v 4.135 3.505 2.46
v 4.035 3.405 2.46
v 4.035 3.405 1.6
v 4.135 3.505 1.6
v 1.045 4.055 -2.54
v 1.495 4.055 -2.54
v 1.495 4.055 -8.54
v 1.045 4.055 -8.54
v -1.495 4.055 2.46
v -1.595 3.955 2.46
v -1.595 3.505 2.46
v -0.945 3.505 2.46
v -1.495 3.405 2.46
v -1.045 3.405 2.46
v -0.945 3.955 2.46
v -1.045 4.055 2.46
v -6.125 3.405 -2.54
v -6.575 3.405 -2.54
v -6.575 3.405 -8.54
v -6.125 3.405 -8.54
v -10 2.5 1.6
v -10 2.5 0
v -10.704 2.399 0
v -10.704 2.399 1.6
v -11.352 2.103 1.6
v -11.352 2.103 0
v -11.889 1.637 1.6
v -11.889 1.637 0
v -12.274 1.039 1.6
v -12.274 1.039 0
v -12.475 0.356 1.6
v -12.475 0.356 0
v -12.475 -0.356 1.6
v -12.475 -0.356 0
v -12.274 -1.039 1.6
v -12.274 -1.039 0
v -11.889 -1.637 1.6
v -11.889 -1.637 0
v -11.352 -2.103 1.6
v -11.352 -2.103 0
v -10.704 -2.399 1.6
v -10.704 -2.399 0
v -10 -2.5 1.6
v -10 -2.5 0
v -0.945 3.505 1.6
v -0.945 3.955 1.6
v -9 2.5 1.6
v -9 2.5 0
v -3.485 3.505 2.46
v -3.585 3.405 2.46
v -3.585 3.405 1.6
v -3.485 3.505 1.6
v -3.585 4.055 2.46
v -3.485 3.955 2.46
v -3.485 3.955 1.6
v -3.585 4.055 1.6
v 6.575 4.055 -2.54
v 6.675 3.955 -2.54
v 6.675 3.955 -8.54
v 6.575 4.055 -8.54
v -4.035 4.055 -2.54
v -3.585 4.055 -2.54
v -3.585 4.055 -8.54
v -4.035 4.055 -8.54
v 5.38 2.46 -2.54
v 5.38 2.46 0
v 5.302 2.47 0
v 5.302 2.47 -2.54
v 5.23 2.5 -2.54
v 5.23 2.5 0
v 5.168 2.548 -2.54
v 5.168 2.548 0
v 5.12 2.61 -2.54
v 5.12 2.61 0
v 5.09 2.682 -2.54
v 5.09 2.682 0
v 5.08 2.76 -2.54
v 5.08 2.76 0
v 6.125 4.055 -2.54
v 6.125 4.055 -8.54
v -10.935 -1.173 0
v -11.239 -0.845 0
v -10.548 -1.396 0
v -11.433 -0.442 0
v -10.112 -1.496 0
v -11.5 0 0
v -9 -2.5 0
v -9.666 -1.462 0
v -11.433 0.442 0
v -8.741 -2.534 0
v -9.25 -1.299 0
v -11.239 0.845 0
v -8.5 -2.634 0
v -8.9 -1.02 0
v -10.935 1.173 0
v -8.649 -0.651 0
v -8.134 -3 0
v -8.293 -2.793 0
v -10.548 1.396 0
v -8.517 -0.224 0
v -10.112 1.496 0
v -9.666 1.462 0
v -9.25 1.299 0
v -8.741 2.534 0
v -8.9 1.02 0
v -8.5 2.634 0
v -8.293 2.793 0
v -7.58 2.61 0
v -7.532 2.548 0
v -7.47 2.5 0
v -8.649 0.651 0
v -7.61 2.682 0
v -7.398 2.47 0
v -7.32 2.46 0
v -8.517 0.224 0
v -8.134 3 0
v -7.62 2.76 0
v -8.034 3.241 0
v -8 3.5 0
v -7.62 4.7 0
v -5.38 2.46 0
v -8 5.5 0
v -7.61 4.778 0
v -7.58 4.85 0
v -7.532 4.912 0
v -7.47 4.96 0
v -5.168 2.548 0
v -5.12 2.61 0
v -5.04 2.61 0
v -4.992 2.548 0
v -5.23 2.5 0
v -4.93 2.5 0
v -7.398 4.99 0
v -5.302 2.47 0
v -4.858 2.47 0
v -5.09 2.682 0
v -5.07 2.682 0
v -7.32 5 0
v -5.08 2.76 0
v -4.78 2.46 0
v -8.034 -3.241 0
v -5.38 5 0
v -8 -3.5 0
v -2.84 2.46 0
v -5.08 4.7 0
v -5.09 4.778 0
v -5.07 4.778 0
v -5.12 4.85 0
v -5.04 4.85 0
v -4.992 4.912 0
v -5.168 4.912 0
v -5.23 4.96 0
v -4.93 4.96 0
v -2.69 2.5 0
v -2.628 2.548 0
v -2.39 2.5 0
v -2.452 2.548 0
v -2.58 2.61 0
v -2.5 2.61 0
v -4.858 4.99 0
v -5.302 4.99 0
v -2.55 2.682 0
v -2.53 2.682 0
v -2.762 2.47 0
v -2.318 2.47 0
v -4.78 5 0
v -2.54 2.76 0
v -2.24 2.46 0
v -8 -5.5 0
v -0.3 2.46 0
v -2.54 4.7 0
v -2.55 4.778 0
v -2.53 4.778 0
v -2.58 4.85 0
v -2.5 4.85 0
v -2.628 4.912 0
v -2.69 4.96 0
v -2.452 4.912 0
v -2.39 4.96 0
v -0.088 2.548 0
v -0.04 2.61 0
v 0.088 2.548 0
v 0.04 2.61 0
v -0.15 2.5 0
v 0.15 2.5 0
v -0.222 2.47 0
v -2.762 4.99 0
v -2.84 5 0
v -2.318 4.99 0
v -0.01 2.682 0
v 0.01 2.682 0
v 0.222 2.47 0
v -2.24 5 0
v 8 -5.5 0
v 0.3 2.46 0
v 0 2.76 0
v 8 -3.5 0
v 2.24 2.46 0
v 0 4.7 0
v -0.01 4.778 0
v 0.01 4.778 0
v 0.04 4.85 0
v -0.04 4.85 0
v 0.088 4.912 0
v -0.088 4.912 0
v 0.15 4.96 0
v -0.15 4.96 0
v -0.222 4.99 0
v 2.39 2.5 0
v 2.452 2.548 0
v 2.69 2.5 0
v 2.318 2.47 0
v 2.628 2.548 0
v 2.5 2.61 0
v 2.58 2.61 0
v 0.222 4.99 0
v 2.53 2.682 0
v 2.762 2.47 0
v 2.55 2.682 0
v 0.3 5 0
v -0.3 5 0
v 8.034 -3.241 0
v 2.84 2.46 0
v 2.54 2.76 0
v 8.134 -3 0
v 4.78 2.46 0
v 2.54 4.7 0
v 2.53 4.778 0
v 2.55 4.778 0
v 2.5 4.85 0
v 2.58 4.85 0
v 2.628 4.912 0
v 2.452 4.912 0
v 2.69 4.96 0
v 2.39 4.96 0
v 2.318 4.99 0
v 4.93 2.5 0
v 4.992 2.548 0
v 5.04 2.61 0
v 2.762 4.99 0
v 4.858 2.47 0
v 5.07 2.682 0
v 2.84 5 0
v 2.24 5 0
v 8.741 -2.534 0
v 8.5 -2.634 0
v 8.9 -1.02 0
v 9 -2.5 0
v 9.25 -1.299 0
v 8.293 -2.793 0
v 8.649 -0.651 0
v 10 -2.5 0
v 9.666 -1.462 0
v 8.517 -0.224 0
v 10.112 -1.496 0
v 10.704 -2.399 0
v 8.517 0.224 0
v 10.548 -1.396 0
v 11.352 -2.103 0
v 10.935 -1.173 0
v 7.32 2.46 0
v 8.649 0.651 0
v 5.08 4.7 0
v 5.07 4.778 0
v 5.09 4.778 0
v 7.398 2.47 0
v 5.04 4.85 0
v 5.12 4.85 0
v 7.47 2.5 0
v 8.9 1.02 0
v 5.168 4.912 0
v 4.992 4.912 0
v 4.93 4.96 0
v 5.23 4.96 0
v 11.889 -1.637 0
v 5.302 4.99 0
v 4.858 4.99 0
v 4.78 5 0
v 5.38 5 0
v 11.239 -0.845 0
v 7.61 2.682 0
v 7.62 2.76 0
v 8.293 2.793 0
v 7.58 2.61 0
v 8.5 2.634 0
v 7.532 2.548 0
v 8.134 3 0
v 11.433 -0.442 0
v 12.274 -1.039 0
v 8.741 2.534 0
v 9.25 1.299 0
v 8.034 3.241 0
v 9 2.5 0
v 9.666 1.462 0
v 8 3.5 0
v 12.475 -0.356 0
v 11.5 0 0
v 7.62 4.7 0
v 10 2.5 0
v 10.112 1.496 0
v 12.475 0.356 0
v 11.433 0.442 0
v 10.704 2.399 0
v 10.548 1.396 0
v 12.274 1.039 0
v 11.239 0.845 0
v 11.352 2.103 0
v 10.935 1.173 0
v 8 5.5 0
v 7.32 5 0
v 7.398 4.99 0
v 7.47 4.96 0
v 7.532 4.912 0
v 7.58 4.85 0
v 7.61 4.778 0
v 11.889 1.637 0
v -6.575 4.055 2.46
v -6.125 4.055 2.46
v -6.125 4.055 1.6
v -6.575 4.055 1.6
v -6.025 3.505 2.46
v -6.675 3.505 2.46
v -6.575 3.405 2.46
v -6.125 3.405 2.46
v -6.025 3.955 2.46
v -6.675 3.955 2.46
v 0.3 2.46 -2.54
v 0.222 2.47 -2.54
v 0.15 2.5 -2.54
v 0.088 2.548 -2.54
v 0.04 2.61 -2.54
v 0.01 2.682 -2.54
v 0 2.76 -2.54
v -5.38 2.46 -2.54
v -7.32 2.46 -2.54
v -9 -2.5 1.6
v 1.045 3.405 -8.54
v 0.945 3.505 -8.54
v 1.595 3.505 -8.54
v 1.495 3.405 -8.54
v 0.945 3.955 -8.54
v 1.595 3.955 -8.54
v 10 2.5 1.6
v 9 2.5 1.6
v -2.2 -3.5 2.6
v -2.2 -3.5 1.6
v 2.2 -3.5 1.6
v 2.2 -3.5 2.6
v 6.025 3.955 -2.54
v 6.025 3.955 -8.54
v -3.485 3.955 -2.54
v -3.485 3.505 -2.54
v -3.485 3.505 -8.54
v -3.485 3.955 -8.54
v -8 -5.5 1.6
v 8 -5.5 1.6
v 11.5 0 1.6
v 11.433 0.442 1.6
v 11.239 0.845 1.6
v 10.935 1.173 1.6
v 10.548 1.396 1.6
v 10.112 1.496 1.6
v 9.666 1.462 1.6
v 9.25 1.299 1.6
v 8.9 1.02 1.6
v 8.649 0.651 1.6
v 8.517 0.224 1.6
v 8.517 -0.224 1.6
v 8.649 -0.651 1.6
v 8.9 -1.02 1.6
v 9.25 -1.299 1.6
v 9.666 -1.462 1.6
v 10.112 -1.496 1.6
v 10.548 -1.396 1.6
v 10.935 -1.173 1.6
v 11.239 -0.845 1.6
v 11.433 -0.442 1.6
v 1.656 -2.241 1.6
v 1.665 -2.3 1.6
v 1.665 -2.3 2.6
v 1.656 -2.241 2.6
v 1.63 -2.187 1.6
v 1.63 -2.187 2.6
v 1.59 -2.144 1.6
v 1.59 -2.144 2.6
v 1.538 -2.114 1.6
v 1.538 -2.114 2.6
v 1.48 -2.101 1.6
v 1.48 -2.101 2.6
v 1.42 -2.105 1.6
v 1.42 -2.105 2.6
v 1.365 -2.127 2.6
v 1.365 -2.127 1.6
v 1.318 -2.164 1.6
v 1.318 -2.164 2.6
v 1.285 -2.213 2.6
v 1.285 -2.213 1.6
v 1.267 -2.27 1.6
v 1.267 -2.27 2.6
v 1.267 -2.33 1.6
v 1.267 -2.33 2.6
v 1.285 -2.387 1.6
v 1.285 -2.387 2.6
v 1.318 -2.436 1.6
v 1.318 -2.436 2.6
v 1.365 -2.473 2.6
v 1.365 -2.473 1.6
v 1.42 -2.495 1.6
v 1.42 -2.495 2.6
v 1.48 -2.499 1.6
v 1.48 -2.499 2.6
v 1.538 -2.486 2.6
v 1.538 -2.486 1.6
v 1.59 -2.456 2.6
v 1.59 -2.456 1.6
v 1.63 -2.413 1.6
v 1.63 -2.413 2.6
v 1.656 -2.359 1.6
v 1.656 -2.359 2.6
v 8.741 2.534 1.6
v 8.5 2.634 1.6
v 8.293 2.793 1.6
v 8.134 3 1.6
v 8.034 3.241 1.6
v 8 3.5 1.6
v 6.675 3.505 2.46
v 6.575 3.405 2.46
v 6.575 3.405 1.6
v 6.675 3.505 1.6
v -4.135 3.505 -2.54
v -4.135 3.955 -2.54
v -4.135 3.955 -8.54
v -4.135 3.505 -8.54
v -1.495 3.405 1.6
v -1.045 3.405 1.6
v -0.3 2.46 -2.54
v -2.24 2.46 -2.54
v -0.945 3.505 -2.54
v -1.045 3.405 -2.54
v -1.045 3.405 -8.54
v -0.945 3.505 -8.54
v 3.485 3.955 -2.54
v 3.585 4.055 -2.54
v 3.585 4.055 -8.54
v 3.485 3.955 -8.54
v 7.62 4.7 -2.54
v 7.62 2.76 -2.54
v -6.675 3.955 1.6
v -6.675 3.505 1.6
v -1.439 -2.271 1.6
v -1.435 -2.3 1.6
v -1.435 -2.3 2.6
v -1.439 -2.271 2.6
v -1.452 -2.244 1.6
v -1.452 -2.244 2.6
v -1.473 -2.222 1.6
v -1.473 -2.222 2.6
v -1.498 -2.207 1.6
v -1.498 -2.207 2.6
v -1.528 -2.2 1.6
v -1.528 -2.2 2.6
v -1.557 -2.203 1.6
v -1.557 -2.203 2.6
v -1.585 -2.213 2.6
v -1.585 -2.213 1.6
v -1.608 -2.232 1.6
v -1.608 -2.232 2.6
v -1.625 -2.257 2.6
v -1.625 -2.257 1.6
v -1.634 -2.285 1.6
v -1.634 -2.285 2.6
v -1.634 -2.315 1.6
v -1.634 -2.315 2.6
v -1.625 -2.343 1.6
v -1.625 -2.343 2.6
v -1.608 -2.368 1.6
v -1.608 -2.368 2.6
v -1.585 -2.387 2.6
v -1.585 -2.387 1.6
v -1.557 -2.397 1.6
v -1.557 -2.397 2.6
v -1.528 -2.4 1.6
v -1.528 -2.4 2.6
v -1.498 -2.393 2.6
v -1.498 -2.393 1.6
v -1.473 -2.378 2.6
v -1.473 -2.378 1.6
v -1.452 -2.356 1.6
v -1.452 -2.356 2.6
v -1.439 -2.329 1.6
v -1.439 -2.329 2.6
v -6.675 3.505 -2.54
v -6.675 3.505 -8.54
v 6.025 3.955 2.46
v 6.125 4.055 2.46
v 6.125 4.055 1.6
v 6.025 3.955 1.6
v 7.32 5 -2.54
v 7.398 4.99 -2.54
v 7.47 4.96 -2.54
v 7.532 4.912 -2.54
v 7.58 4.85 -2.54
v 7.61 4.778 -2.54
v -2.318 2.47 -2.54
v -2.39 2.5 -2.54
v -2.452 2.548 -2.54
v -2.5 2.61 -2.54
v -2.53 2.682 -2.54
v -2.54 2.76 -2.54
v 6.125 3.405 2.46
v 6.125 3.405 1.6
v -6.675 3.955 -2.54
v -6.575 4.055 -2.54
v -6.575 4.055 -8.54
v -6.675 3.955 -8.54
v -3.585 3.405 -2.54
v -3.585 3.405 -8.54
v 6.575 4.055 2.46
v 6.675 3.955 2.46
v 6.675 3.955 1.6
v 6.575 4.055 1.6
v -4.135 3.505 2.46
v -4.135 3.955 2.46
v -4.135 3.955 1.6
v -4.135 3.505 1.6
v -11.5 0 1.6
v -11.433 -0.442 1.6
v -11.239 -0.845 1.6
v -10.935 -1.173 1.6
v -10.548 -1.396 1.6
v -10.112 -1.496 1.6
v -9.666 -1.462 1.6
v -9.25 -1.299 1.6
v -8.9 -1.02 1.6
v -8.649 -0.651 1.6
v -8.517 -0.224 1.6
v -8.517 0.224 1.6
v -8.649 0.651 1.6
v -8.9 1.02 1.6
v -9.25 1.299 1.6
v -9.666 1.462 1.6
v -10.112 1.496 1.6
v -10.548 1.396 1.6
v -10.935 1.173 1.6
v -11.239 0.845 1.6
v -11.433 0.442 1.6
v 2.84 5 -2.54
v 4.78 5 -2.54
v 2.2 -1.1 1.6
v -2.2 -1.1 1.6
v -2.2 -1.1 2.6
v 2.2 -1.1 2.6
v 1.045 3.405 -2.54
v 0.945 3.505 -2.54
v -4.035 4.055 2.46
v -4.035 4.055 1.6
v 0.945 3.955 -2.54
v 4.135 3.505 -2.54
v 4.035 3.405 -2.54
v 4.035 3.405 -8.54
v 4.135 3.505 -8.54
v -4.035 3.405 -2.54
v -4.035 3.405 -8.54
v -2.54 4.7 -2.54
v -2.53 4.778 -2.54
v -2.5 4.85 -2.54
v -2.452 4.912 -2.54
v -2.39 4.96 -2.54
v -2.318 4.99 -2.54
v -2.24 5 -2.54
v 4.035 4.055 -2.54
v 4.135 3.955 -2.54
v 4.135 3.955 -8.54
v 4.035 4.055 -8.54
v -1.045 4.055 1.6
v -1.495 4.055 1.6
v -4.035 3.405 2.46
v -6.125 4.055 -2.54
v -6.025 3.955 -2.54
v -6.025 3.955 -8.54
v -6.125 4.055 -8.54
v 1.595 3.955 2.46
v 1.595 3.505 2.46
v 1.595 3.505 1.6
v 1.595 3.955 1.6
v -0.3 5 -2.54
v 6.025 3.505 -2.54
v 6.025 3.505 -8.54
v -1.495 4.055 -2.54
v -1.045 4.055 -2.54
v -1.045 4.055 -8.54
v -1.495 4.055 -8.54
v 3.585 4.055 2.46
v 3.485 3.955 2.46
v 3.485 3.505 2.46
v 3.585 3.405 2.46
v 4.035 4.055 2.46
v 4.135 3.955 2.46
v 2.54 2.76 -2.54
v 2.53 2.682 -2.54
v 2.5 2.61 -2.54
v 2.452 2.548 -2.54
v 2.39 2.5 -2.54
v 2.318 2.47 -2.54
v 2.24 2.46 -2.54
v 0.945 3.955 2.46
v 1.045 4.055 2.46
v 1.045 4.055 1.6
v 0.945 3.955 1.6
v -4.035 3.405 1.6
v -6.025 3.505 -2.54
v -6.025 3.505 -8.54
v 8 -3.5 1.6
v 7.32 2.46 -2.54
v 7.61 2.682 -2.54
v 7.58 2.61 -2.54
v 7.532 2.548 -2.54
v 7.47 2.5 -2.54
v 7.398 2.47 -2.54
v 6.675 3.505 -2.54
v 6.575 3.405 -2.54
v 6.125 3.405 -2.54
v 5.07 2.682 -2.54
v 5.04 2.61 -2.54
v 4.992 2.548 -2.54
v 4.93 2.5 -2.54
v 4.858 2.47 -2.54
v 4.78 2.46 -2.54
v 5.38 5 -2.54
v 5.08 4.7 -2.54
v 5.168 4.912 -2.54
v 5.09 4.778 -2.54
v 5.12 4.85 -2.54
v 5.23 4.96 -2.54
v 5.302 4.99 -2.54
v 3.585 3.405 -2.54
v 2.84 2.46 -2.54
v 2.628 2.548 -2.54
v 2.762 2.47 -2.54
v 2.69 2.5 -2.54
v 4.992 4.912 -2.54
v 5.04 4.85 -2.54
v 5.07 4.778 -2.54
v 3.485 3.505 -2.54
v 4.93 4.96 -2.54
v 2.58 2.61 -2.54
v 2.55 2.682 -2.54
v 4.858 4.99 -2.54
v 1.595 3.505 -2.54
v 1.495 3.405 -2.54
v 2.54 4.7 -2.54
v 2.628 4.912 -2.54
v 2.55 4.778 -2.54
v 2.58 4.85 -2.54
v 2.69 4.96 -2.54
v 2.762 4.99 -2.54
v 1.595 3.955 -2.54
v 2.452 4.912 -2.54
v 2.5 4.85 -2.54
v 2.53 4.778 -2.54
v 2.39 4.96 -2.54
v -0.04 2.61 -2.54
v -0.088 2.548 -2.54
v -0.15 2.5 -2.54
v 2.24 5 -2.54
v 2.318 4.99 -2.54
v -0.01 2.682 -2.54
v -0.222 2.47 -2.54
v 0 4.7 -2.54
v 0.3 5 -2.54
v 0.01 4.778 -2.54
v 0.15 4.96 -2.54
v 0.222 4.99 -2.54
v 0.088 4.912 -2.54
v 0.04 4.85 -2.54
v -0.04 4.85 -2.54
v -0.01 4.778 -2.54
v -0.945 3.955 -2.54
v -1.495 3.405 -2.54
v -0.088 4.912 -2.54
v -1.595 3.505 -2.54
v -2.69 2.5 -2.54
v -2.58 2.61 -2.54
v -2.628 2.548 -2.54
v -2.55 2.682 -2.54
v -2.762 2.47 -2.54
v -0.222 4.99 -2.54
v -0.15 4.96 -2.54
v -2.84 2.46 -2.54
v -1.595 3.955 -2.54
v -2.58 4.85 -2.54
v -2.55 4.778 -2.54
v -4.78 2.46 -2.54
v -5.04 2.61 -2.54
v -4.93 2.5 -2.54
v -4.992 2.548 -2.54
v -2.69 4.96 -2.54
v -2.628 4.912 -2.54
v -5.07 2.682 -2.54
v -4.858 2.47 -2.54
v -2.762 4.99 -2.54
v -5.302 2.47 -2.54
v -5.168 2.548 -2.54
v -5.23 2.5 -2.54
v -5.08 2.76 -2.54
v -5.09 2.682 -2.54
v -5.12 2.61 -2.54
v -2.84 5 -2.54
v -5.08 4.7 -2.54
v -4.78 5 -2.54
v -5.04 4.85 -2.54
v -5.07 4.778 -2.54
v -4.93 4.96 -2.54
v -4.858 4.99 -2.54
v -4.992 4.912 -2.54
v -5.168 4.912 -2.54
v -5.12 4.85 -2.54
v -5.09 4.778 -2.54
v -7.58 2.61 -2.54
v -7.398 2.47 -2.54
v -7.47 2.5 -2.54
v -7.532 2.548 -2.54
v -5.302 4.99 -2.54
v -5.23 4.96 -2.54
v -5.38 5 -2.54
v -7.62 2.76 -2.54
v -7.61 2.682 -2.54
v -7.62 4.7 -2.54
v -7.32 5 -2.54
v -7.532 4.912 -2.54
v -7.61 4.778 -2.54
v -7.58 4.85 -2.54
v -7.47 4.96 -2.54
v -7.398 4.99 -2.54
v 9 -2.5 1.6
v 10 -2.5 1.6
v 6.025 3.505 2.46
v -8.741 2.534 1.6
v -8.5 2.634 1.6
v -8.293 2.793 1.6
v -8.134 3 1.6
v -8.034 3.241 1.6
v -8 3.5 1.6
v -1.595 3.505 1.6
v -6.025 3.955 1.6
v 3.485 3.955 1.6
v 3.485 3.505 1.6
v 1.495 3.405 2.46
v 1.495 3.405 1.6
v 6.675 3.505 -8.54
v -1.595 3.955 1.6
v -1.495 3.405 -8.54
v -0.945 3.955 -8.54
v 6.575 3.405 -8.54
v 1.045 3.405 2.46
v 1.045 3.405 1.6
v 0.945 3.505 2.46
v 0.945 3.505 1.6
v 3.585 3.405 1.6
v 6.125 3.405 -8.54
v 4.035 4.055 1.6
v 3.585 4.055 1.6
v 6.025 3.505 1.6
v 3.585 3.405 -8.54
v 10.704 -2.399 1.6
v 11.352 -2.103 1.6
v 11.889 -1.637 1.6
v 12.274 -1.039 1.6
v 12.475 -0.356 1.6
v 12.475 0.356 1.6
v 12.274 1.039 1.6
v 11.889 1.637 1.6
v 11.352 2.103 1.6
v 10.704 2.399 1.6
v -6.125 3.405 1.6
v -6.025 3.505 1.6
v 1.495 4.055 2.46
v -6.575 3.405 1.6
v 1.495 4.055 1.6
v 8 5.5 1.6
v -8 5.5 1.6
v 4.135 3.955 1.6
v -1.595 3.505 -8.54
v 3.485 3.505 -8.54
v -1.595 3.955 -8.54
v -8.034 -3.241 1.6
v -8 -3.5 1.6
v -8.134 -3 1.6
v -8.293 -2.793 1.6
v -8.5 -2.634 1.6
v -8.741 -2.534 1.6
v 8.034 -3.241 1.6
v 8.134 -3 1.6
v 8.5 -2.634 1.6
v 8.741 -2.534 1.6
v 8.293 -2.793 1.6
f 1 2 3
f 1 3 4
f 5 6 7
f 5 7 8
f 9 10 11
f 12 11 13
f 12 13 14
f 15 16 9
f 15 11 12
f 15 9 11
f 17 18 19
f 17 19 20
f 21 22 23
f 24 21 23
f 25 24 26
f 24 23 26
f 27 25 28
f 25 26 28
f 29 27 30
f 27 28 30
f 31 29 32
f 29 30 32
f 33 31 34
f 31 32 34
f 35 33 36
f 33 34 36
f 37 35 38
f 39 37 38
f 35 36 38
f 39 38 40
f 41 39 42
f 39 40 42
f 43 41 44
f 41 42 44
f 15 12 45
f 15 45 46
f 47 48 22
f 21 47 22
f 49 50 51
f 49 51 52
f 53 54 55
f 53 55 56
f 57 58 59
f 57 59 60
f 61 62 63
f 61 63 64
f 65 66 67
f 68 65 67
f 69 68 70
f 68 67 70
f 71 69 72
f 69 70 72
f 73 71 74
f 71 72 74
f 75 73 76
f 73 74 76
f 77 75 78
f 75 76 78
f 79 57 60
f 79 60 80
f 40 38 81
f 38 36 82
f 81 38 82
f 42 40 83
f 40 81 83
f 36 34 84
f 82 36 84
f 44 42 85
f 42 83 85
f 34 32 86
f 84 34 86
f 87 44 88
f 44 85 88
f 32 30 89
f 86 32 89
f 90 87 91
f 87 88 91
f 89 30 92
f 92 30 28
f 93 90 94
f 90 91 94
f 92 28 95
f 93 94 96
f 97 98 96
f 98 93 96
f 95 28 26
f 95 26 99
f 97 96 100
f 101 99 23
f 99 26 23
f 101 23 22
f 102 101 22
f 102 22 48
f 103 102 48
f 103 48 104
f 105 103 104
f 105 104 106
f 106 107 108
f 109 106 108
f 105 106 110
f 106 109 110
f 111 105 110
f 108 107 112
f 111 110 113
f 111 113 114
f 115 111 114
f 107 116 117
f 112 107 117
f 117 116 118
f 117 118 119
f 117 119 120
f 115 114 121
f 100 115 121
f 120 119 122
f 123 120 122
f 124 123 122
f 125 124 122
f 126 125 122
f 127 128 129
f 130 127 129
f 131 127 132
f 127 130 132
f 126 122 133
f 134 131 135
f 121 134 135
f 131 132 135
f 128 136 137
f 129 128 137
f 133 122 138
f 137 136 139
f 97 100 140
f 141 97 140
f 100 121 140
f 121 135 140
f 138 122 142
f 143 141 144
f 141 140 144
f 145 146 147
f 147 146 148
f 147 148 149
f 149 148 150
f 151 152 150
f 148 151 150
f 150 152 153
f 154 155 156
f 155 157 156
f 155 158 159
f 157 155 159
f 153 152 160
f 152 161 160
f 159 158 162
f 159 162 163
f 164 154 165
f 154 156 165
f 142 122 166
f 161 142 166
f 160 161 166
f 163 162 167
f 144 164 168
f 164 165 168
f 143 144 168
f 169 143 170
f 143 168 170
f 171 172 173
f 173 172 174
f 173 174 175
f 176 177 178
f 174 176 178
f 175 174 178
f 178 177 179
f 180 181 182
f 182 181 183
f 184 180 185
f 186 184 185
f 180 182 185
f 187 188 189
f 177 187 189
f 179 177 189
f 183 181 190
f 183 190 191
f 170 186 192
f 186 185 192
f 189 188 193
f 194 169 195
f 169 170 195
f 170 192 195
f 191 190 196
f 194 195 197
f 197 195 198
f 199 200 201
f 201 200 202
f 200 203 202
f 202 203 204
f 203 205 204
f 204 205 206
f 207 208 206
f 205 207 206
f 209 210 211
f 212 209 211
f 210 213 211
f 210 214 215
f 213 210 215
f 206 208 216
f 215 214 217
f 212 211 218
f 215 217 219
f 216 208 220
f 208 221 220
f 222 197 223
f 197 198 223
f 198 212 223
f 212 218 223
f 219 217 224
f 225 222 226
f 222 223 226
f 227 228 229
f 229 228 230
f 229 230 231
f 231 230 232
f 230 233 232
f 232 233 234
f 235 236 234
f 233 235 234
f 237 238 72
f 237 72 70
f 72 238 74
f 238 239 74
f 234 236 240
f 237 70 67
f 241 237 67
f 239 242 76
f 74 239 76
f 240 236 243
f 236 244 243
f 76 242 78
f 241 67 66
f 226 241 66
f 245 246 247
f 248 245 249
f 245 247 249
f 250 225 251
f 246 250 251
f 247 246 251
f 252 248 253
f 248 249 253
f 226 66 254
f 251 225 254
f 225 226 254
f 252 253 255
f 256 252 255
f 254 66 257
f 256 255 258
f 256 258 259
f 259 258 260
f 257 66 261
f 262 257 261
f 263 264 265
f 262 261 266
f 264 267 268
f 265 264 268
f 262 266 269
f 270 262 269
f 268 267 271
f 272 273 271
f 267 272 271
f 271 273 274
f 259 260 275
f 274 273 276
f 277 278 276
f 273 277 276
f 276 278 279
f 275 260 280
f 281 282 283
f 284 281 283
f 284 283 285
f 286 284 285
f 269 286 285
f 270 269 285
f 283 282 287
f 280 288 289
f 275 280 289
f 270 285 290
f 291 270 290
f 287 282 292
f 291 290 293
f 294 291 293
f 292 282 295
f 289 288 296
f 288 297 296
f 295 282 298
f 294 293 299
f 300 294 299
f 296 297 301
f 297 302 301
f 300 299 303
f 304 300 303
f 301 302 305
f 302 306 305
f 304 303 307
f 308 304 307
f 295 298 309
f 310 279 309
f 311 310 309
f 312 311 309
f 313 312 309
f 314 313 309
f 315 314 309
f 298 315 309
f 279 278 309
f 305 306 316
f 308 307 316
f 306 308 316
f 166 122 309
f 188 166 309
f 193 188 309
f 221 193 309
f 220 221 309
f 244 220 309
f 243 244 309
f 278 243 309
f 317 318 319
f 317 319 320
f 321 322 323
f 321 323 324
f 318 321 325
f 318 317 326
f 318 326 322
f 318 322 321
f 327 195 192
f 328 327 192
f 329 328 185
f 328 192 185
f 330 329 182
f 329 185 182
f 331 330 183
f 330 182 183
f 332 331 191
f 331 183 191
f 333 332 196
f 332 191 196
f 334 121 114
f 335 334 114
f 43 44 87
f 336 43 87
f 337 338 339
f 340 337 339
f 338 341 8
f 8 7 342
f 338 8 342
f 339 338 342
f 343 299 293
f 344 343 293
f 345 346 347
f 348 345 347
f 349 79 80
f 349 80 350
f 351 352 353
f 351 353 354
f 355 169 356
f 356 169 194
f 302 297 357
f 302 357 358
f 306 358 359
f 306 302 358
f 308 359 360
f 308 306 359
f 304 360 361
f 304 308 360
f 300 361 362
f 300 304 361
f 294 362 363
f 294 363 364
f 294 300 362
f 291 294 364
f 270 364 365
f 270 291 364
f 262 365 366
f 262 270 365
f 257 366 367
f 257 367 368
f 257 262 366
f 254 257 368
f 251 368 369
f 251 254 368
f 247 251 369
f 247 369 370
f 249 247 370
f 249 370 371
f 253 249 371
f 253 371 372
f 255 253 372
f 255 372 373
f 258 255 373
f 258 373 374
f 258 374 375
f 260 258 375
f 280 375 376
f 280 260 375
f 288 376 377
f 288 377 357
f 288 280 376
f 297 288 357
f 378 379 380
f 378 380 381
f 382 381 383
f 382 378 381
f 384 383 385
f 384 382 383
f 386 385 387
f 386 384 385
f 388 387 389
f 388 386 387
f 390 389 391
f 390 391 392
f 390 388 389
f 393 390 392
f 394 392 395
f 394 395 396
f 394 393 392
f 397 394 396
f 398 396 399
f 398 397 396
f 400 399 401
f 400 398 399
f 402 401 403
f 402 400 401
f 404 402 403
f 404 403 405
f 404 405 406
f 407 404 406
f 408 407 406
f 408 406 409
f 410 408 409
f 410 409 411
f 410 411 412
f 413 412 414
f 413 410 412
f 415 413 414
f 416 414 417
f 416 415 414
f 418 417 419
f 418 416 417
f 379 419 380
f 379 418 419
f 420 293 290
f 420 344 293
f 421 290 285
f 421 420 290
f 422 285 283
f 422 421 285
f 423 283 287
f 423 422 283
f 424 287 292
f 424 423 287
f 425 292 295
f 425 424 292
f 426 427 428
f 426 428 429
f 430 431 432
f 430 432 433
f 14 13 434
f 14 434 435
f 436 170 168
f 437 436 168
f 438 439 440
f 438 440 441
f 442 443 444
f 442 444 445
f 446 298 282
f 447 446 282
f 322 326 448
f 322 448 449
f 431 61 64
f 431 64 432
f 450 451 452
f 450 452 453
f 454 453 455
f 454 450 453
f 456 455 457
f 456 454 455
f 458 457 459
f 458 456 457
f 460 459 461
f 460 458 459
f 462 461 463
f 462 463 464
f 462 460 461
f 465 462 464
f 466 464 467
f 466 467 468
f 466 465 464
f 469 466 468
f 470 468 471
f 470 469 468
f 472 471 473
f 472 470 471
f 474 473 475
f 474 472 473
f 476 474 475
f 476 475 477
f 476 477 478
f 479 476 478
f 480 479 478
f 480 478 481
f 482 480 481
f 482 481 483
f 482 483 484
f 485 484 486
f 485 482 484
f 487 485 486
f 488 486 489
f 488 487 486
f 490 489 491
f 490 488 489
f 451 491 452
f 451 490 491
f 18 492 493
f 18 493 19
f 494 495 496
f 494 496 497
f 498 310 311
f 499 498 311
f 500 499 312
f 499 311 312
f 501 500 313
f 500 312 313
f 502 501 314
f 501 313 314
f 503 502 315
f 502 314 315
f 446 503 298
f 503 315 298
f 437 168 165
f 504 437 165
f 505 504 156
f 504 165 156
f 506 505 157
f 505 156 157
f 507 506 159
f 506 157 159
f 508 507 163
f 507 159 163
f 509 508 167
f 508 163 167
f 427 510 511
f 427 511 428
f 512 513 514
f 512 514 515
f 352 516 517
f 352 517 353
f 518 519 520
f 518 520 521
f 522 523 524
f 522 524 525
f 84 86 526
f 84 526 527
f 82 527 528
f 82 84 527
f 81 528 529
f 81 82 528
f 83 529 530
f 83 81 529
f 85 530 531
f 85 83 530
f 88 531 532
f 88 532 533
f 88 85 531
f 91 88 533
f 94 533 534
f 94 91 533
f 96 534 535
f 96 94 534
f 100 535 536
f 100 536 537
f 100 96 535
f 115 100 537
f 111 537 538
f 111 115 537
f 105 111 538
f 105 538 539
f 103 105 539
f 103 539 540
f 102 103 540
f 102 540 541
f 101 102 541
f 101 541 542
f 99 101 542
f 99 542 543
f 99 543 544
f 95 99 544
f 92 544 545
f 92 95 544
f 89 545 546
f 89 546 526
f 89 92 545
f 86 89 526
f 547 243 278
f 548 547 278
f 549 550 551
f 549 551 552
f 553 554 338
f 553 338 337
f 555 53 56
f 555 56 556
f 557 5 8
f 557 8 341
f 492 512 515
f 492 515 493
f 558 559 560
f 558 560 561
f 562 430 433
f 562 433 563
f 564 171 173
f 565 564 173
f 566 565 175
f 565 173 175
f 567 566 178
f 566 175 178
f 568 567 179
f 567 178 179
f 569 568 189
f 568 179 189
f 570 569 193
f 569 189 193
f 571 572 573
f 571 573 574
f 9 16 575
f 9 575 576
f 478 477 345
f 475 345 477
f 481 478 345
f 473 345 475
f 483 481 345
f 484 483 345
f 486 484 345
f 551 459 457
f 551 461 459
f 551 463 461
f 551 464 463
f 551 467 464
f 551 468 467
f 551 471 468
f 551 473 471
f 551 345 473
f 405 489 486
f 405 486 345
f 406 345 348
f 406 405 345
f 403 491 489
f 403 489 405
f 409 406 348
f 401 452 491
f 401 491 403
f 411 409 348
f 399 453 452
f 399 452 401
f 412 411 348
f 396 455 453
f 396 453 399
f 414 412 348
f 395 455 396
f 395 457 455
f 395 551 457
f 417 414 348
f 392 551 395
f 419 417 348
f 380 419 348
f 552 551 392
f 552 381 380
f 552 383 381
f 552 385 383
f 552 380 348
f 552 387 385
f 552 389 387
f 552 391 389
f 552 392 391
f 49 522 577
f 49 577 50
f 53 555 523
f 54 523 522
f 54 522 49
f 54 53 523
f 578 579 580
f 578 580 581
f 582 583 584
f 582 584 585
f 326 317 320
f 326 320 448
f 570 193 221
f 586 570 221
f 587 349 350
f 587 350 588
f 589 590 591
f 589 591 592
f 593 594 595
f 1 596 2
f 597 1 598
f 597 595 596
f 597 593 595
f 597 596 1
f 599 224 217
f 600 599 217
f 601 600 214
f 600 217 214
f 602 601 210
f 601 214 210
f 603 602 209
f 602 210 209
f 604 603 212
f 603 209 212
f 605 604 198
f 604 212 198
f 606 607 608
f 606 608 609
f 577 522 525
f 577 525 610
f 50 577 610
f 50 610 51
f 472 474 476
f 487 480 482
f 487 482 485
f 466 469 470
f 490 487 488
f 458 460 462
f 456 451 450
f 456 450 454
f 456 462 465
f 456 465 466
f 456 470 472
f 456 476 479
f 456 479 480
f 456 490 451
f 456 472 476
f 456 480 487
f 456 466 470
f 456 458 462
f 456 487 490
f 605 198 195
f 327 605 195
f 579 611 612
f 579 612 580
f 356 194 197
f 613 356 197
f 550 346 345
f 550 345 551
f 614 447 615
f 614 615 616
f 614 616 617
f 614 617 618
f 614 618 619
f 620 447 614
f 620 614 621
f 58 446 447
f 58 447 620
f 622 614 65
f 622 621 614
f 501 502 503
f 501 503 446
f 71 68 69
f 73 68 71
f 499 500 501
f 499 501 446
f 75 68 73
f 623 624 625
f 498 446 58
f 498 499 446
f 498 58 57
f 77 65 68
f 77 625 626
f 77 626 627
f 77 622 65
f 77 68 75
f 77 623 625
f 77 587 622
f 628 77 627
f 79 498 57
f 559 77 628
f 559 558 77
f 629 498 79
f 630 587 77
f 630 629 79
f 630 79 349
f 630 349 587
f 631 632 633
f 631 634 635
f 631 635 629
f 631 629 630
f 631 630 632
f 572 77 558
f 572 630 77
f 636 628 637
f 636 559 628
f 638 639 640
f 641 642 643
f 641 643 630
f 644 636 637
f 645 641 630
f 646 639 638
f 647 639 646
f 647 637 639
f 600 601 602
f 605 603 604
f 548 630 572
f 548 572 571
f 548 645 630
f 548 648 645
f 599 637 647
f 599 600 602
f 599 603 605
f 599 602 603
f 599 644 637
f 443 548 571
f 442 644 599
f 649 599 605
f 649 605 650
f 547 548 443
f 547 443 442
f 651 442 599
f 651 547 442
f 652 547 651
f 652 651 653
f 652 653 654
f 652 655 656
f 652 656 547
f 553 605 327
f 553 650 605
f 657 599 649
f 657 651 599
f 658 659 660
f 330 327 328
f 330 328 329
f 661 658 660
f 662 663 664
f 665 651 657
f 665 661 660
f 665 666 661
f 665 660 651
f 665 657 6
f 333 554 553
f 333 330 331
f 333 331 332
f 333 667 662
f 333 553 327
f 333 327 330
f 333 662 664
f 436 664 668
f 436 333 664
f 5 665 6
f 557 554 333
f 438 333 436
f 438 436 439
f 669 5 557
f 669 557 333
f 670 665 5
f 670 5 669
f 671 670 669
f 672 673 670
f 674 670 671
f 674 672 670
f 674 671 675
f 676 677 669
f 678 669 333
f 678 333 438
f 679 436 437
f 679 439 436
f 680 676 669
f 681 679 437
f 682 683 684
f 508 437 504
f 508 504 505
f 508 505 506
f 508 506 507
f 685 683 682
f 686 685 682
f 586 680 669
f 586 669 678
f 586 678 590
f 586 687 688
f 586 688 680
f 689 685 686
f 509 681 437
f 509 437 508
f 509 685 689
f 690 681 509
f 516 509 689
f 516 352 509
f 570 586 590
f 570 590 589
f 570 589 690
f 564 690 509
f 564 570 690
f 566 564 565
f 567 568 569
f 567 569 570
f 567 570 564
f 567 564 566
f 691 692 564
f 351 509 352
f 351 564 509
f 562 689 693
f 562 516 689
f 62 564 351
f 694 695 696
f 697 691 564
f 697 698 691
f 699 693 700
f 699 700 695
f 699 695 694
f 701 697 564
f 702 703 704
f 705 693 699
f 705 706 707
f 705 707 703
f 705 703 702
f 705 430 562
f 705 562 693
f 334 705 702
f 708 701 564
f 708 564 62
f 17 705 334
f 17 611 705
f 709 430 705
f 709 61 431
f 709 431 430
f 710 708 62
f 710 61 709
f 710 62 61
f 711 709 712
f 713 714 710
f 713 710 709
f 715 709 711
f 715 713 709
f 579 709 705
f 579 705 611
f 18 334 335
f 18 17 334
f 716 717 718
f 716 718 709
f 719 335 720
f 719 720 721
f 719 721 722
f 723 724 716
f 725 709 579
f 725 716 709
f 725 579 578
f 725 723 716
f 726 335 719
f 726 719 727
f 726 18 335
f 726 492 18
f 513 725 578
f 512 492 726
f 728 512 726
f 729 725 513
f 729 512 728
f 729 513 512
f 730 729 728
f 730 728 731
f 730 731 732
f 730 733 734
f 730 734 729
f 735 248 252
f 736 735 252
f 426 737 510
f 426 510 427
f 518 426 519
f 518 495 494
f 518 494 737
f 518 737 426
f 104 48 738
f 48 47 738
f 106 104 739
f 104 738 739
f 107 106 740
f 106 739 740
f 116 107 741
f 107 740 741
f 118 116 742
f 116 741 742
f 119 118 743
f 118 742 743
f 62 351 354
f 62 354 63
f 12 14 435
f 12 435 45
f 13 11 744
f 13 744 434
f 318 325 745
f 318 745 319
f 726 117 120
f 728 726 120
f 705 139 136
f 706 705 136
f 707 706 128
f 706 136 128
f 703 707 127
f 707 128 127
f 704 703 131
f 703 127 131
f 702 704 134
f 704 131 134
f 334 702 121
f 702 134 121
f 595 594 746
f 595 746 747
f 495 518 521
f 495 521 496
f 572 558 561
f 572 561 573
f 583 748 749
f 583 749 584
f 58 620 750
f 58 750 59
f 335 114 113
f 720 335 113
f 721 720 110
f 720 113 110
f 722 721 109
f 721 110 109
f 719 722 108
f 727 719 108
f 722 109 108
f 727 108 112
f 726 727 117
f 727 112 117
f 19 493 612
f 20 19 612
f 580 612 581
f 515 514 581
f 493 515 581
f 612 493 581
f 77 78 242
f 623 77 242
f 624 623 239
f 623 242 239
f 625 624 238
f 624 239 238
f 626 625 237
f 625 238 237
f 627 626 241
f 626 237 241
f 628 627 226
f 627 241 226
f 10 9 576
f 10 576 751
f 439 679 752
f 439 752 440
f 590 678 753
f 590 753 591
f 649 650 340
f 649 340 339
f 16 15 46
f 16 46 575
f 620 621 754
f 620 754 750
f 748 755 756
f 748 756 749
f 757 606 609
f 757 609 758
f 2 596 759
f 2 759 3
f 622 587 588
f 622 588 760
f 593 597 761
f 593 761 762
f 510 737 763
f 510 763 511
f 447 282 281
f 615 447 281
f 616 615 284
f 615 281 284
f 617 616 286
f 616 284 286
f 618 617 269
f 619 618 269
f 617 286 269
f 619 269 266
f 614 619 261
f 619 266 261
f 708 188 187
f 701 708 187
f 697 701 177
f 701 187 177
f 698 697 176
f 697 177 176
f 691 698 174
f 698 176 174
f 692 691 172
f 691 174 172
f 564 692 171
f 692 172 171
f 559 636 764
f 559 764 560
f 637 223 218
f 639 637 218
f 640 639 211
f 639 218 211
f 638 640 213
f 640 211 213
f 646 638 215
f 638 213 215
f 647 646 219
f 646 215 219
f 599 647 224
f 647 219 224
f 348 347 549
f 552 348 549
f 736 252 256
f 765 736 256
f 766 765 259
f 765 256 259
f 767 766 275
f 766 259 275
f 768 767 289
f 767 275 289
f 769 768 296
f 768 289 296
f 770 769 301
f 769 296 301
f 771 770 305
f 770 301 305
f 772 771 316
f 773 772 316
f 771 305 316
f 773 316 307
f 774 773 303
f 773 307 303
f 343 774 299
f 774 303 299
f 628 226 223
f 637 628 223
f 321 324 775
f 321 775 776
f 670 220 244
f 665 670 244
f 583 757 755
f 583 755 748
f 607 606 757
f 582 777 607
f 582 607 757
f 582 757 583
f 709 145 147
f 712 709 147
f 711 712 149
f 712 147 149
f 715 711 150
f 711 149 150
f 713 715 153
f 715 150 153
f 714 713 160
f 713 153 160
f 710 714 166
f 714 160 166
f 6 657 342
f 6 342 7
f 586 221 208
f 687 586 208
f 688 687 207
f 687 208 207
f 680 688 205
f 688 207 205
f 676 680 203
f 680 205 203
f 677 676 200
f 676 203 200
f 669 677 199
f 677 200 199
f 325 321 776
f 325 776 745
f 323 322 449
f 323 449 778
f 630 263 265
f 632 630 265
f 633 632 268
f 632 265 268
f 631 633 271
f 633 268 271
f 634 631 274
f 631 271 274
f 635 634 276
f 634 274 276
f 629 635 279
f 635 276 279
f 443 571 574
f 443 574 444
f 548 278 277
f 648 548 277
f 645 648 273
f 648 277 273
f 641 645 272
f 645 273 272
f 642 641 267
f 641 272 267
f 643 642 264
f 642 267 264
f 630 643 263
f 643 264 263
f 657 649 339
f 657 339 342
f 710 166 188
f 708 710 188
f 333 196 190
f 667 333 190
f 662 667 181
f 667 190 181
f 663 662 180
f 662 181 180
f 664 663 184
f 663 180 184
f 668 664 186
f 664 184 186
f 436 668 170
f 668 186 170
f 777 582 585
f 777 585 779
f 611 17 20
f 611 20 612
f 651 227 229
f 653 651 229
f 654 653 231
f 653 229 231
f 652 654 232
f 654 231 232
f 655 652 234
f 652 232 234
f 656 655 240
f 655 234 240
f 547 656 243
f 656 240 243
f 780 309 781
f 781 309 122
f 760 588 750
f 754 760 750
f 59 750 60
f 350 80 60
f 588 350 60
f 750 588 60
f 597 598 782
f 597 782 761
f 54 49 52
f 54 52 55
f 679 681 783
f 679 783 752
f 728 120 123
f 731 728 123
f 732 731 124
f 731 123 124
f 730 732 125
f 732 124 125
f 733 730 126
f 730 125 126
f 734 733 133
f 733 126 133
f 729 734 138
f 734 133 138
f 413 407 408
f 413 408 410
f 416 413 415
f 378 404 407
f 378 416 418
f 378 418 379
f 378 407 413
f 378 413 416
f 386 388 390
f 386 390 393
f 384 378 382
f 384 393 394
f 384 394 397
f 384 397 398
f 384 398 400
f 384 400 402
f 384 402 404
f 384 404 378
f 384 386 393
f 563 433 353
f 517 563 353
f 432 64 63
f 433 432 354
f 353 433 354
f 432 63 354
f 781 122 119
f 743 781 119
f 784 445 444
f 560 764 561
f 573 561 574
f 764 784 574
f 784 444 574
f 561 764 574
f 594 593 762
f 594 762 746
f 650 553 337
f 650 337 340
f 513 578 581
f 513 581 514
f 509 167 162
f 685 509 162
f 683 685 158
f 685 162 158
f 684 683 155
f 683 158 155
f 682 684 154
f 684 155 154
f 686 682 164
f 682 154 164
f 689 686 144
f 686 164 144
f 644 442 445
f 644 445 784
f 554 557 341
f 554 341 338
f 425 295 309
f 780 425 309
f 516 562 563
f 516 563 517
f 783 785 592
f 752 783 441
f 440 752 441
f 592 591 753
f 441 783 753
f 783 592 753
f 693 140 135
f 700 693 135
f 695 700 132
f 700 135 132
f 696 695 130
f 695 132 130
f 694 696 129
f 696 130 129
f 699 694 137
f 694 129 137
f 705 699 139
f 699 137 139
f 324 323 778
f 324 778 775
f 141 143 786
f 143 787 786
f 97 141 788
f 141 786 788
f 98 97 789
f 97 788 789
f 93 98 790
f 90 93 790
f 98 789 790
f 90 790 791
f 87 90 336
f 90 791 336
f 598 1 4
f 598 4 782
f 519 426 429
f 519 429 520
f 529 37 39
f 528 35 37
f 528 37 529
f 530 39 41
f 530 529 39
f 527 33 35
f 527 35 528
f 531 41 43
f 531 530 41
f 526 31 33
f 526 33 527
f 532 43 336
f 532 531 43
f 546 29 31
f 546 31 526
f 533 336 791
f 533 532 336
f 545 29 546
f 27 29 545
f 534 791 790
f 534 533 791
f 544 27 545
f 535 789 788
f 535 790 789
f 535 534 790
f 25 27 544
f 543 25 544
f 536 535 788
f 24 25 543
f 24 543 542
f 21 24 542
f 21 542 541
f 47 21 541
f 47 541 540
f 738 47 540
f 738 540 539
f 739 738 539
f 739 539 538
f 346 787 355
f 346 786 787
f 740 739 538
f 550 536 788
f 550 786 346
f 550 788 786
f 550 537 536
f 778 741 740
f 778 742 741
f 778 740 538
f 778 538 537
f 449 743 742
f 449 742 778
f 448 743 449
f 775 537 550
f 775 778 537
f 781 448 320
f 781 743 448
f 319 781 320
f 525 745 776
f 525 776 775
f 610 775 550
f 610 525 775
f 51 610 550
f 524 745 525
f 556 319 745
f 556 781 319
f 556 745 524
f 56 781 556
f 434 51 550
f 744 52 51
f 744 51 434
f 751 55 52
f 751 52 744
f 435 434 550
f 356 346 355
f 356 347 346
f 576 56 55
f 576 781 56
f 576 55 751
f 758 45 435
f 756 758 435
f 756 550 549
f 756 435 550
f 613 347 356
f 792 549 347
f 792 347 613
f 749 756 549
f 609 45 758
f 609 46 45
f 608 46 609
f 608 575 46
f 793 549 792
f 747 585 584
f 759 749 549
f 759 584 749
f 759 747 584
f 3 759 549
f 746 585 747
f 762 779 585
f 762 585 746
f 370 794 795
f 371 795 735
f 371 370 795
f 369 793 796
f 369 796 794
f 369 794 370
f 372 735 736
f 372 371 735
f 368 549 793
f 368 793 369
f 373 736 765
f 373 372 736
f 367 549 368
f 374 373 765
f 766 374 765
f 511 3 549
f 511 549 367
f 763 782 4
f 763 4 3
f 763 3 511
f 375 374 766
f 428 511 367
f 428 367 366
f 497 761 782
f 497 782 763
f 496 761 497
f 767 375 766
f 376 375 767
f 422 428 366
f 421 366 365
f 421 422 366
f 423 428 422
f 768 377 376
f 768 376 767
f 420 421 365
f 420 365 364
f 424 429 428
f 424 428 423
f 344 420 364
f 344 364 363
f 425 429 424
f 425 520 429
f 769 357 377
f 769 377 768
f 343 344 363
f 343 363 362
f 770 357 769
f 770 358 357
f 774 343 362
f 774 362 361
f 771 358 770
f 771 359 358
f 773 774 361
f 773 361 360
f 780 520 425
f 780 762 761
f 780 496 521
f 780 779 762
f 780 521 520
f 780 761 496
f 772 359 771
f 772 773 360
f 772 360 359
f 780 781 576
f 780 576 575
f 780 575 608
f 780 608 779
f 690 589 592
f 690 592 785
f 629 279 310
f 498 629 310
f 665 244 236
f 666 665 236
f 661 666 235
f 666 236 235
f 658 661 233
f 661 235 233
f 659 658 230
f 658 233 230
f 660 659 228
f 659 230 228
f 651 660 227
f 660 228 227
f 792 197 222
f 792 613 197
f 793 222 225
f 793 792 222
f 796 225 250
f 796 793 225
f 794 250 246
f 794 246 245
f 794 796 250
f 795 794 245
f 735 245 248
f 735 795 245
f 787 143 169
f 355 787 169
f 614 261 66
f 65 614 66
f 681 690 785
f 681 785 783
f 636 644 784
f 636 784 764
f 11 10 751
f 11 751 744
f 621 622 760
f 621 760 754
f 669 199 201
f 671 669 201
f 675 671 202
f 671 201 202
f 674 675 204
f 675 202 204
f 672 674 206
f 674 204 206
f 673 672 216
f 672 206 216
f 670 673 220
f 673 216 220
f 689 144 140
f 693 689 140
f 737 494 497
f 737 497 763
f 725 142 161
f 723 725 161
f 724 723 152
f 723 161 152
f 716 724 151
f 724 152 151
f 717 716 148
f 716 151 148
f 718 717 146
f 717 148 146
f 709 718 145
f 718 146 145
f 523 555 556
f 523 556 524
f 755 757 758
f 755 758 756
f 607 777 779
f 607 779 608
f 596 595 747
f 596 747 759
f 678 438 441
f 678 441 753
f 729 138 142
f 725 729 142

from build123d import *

# Parameters (mm, degrees)
CROQUIS1_R                   = 1.5
SALIENTE_EXTRUIR1_DEPTH      = 1.6
CROQUIS2_W                   = 4.4
CROQUIS2_H                   = 2.4
CROQUIS2_R                   = 0.1
CROQUIS2_R_2                 = 0.2
SALIENTE_EXTRUIR2_DEPTH      = 1
REDONDEO1_R                  = 1
SALIENTE_EXTRUIR3_DEPTH      = 2.54
SALIENTE_EXTRUIR4_DEPTH      = 6
SALIENTE_EXTRUIR4_DEPTH_BACK = 5


with BuildPart() as part:
    # Croquis1 → Saliente-Extruir1 (new body)
    with BuildSketch(Plane.XY):
        with BuildLine():
            Line((-8, -5.5), (8, -5.5))
            Line((8, -5.5), (8, -2.5))
            Line((8, -2.5), (10, -2.5))
            ThreePointArc((10, -2.5), (12.5, 0), (10, 2.5))
            Line((10, 2.5), (8, 2.5))
            Line((8, 2.5), (8, 5.5))
            Line((8, 5.5), (-8, 5.5))
            Line((-8, 5.5), (-8, 2.5))
            Line((-8, 2.5), (-10, 2.5))
            ThreePointArc((-10, 2.5), (-12.5, 0), (-10, -2.5))
            Line((-10, -2.5), (-8, -2.5))
            Line((-8, -2.5), (-8, -5.5))
        make_face()
        with Locations((10, 0)):
            Circle(CROQUIS1_R, mode=Mode.SUBTRACT)
        with Locations(Location((-10, 0, 0), (0, 0, 180))):
            Circle(CROQUIS1_R, mode=Mode.SUBTRACT)
    extrude(amount=SALIENTE_EXTRUIR1_DEPTH)

    # Croquis2 → Saliente-Extruir2 (add)
    with BuildSketch(Plane.XY.offset(1.6)):
        with Locations((0, -2.3)):
            Rectangle(CROQUIS2_W, CROQUIS2_H)
        with Locations((-1.535, -2.3)):
            Circle(CROQUIS2_R, mode=Mode.SUBTRACT)
        with Locations((1.465, -2.3)):
            Circle(CROQUIS2_R_2, mode=Mode.SUBTRACT)
    extrude(amount=SALIENTE_EXTRUIR2_DEPTH)

    # Redondeo1
    redondeo1_edges = [part.edges().sort_by_distance(p)[0] for p in [
        (8, 2.5, 0.8),
        (8, -2.5, 0.8),
        (-8, -2.5, 0.8),
        (-8, 2.5, 0.8),
    ]]
    fillet(redondeo1_edges, radius=REDONDEO1_R)

    # Croquis3 → Saliente-Extruir3 (add)
    with BuildSketch(Plane(origin=(0, 0, 0), x_dir=(-1, 0, 0), z_dir=(0, 0, -1))):
        with BuildLine():
            Line((0.3, 2.46), (2.24, 2.46))
            ThreePointArc((2.24, 2.46), (2.452132034, 2.547867966), (2.54, 2.76))
            ThreePointArc((2.54, 2.76), (2.627867966, 2.547867966), (2.84, 2.46))
            Line((2.84, 2.46), (4.78, 2.46))
            ThreePointArc((4.78, 2.46), (4.992132034, 2.547867966), (5.08, 2.76))
            ThreePointArc((5.08, 2.76), (5.167867966, 2.547867966), (5.38, 2.46))
            Line((5.38, 2.46), (7.32, 2.46))
            ThreePointArc((7.32, 2.46), (7.532132034, 2.547867966), (7.62, 2.76))
            Line((7.62, 2.76), (7.62, 4.7))
            ThreePointArc((7.62, 4.7), (7.532132034, 4.912132034), (7.32, 5))
            Line((7.32, 5), (5.38, 5))
            ThreePointArc((5.38, 5), (5.167867966, 4.912132034), (5.08, 4.7))
            ThreePointArc((5.08, 4.7), (4.992132034, 4.912132034), (4.78, 5))
            Line((4.78, 5), (2.84, 5))
            ThreePointArc((2.84, 5), (2.627867966, 4.912132034), (2.54, 4.7))
            ThreePointArc((2.54, 4.7), (2.452132034, 4.912132034), (2.24, 5))
            Line((2.24, 5), (0.3, 5))
            ThreePointArc((0.3, 5), (0.087867966, 4.912132034), (0, 4.7))
            ThreePointArc((0, 4.7), (-0.087867966, 4.912132034), (-0.3, 5))
            Line((-0.3, 5), (-2.24, 5))
            ThreePointArc((-2.24, 5), (-2.452132034, 4.912132034), (-2.54, 4.7))
            ThreePointArc((-2.54, 4.7), (-2.627867966, 4.912132034), (-2.84, 5))
            Line((-2.84, 5), (-4.78, 5))
            ThreePointArc((-4.78, 5), (-4.992132034, 4.912132034), (-5.08, 4.7))
            ThreePointArc((-5.08, 4.7), (-5.167867966, 4.912132034), (-5.38, 5))
            Line((-5.38, 5), (-7.32, 5))
            ThreePointArc((-7.32, 5), (-7.532132034, 4.912132034), (-7.62, 4.7))
            Line((-7.62, 4.7), (-7.62, 2.76))
            ThreePointArc((-7.62, 2.76), (-7.532132034, 2.547867966), (-7.32, 2.46))
            Line((-7.32, 2.46), (-5.38, 2.46))
            ThreePointArc((-5.38, 2.46), (-5.167867966, 2.547867966), (-5.08, 2.76))
            ThreePointArc((-5.08, 2.76), (-4.992132034, 2.547867966), (-4.78, 2.46))
            Line((-4.78, 2.46), (-2.84, 2.46))
            ThreePointArc((-2.84, 2.46), (-2.627867966, 2.547867966), (-2.54, 2.76))
            ThreePointArc((-2.54, 2.76), (-2.452132034, 2.547867966), (-2.24, 2.46))
            Line((-2.24, 2.46), (-0.3, 2.46))
            ThreePointArc((-0.3, 2.46), (-0.087867966, 2.547867966), (0, 2.76))
            ThreePointArc((0, 2.76), (0.087867966, 2.547867966), (0.3, 2.46))
        make_face()
    extrude(amount=SALIENTE_EXTRUIR3_DEPTH)

    # Croquis4 → Saliente-Extruir4 (add, two sides: drawn at the far end of the back side and taken through both)
    with BuildSketch(Plane(origin=(0, 0, -2.54), x_dir=(-1, 0, 0), z_dir=(0, 0, -1)).offset(-SALIENTE_EXTRUIR4_DEPTH_BACK)):
        Polygon((6.025, 3.505), (6.025, 3.955), (6.125, 4.055), (6.575, 4.055), (6.675, 3.955), (6.675, 3.505), (6.575, 3.405), (6.125, 3.405), align=None)
        Polygon((3.485, 3.505), (3.485, 3.955), (3.585, 4.055), (4.035, 4.055), (4.135, 3.955), (4.135, 3.505), (4.035, 3.405), (3.585, 3.405), align=None)
        Polygon((0.945, 3.505), (0.945, 3.955), (1.045, 4.055), (1.495, 4.055), (1.595, 3.955), (1.595, 3.505), (1.495, 3.405), (1.045, 3.405), align=None)
        Polygon((-4.135, 3.505), (-4.135, 3.955), (-4.035, 4.055), (-3.585, 4.055), (-3.485, 3.955), (-3.485, 3.505), (-3.585, 3.405), (-4.035, 3.405), align=None)
        Polygon((-1.595, 3.505), (-1.595, 3.955), (-1.495, 4.055), (-1.045, 4.055), (-0.945, 3.955), (-0.945, 3.505), (-1.045, 3.405), (-1.495, 3.405), align=None)
        Polygon((-6.675, 3.505), (-6.675, 3.955), (-6.575, 4.055), (-6.125, 4.055), (-6.025, 3.955), (-6.025, 3.505), (-6.125, 3.405), (-6.575, 3.405), align=None)
    extrude(amount=SALIENTE_EXTRUIR4_DEPTH + SALIENTE_EXTRUIR4_DEPTH_BACK)


solid = part.part
